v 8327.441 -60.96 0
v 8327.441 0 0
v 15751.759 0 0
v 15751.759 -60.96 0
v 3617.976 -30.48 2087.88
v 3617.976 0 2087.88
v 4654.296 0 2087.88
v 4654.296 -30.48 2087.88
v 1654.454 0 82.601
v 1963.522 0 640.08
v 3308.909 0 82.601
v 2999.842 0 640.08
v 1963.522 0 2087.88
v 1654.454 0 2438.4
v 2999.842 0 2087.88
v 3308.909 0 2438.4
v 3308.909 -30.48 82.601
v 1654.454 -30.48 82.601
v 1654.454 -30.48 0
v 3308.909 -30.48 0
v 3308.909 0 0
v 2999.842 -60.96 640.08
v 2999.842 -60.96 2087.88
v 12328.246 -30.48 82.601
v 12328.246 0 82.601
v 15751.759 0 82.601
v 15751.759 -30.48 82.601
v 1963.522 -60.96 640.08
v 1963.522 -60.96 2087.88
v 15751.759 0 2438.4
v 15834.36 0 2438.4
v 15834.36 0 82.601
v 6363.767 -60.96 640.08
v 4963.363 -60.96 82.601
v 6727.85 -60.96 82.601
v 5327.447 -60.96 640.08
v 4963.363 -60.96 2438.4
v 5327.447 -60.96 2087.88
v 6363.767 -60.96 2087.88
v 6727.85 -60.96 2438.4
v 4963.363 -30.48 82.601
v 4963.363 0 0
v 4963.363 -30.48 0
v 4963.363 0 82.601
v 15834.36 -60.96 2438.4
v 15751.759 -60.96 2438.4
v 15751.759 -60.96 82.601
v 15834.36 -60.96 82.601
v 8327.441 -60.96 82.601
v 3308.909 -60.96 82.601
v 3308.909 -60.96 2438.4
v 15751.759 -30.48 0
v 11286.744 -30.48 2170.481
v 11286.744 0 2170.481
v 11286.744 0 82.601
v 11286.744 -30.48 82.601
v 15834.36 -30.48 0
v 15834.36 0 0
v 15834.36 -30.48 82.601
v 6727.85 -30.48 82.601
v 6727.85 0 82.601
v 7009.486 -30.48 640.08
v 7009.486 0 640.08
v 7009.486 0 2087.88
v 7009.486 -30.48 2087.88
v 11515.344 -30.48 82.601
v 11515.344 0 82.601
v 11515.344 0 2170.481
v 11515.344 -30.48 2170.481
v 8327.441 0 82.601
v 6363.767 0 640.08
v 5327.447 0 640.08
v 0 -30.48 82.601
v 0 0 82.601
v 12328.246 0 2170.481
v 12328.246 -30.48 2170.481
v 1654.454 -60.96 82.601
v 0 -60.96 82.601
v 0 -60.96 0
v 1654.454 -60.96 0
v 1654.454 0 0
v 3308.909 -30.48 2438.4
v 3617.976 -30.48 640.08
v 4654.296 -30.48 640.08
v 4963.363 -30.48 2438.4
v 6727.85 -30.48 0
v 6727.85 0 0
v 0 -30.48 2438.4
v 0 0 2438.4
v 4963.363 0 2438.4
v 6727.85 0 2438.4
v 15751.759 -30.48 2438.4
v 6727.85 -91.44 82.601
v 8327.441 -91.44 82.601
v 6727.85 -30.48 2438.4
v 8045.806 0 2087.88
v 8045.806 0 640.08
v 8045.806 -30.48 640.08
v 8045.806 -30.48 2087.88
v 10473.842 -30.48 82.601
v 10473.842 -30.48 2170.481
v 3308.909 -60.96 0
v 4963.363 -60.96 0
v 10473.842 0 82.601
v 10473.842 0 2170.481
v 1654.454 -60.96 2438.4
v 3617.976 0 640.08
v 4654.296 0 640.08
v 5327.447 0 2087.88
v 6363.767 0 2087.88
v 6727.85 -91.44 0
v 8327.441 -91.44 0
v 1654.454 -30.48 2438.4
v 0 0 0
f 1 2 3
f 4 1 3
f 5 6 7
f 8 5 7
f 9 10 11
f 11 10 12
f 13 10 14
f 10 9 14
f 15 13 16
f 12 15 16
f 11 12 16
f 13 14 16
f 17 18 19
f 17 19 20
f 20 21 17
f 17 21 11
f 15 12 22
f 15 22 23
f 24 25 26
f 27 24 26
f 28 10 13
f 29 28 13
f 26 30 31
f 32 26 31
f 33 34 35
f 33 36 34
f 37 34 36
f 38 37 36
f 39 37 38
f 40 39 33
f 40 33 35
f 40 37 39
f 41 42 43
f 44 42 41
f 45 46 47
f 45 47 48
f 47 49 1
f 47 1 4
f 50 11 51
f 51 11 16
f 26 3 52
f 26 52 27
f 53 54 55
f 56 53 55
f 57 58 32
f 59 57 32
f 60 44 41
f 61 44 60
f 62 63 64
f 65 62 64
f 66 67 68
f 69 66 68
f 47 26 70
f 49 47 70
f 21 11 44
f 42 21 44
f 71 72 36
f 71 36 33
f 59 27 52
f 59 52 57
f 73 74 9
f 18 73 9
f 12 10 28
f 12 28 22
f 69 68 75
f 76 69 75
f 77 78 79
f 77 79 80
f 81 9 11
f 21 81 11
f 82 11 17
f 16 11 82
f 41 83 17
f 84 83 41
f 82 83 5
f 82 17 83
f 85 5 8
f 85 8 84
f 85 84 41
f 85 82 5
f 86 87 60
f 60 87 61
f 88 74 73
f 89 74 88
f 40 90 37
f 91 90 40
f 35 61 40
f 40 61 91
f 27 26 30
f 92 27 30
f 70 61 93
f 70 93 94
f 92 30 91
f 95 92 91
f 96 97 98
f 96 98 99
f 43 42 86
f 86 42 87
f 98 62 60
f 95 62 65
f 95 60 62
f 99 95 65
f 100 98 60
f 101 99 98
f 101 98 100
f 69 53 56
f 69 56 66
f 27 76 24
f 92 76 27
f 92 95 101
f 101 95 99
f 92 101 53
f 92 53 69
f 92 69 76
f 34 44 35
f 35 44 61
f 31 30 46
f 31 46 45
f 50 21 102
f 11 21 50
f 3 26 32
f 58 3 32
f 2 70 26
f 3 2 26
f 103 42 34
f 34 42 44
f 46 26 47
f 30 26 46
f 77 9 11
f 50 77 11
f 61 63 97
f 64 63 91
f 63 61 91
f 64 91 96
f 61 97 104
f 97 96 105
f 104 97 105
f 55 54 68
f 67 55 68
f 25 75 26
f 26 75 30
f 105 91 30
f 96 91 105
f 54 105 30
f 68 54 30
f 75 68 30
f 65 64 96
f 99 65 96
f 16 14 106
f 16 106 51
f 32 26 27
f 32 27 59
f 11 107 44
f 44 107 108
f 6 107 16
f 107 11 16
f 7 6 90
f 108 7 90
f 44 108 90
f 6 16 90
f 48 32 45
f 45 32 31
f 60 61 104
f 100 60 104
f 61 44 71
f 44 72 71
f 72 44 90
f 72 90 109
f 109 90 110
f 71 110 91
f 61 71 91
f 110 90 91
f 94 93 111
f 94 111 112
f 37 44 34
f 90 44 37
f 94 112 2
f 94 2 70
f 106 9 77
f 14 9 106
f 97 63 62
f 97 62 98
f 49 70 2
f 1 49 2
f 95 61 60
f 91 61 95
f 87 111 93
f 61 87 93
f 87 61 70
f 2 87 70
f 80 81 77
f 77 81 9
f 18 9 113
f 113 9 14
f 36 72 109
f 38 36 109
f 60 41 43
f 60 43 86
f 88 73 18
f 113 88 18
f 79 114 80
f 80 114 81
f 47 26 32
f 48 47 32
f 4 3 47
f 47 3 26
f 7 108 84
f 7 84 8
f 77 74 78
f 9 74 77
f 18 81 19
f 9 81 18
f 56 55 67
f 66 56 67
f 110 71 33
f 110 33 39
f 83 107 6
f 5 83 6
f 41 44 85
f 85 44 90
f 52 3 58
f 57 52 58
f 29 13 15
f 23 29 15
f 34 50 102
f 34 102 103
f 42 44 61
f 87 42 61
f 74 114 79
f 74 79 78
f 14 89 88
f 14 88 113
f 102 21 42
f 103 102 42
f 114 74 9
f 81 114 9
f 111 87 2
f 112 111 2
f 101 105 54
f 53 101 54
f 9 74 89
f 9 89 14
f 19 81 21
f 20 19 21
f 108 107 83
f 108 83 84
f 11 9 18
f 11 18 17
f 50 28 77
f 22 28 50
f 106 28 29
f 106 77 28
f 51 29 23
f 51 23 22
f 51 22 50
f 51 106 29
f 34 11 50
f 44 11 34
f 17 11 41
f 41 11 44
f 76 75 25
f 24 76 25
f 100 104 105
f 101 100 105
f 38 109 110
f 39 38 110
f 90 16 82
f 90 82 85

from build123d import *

# Parameters (mm, degrees)
F0_W     = 1654.4544
F0_H     = 2355.7992
F0_H_2   = 82.6008
F0_W_2   = 1036.32
F0_H_3   = 1447.8
F0_W_3   = 1764.4872
F0_W_4   = 1599.5904
F0_W_5   = 82.6008
F1_DEPTH = 30.48
F2_DEPTH = 60.96
F3_DEPTH = 91.44


with BuildPart() as f1:
    # F0 (on Front) → F1 (new body)
    with BuildSketch(Plane.XZ):
        with Locations((827.2272, 1260.5004)):
            Rectangle(F0_W, F0_H)
        with Locations((2481.6816, 41.3004)):
            Rectangle(F0_W, F0_H_2)
        with Locations((4136.136, 1260.5004)):
            Rectangle(F0_W, F0_H)
        with Locations((4136.136, 1363.98)):
            Rectangle(F0_W_2, F0_H_3, mode=Mode.SUBTRACT)
        with Locations((5845.6068, 41.3004)):
            Rectangle(F0_W_3, F0_H_2)
        with Locations((7527.6456, 1260.5004)):
            Rectangle(F0_W_4, F0_H)
        with Locations((7527.6456, 1363.98)):
            Rectangle(F0_W_2, F0_H_3, mode=Mode.SUBTRACT)
        Polygon((8327.4408, 2438.4), (8327.4408, 82.6008), (10473.8424, 82.6008), (10473.8424, 2170.4808), (11286.744, 2170.4808), (11286.744, 82.6008), (11515.344, 82.6008), (11515.344, 2170.4808), (12328.2456, 2170.4808), (12328.2456, 82.6008), (15751.7592, 82.6008), (15751.7592, 2438.4), align=None)
        with Locations((15793.0596, 41.3004)):
            Rectangle(F0_W_5, F0_H_2)
    extrude(amount=F1_DEPTH)


with BuildPart() as f2:
    # F0 (on Front) → F2 (new body)
    with BuildSketch(Plane.XZ):
        Polygon((8327.4408, 82.6008), (8327.4408, 0), (15751.7592, 0), (15751.7592, 82.6008), (12328.2456, 82.6008), (11515.344, 82.6008), (11286.744, 82.6008), (10473.8424, 82.6008), align=None)
        with Locations((15793.0596, 1260.5004)):
            Rectangle(F0_W_5, F0_H)
        with Locations((5845.6068, 1260.5004)):
            Rectangle(F0_W_3, F0_H)
        with Locations((5845.6068, 1363.98)):
            Rectangle(F0_W_2, F0_H_3, mode=Mode.SUBTRACT)
        with Locations((2481.6816, 1260.5004)):
            Rectangle(F0_W, F0_H)
        with Locations((2481.6816, 1363.98)):
            Rectangle(F0_W_2, F0_H_3, mode=Mode.SUBTRACT)
        with Locations((4136.136, 41.3004)):
            Rectangle(F0_W, F0_H_2)
        with Locations((827.2272, 41.3004)):
            Rectangle(F0_W, F0_H_2)
    extrude(amount=F2_DEPTH)


with BuildPart() as f3:
    # F0 (on Front) → F3 (new body)
    with BuildSketch(Plane.XZ):
        with Locations((7527.6456, 41.3004)):
            Rectangle(F0_W_4, F0_H_2)
    extrude(amount=F3_DEPTH)


solid = Compound([f1.part, f2.part, f3.part])
